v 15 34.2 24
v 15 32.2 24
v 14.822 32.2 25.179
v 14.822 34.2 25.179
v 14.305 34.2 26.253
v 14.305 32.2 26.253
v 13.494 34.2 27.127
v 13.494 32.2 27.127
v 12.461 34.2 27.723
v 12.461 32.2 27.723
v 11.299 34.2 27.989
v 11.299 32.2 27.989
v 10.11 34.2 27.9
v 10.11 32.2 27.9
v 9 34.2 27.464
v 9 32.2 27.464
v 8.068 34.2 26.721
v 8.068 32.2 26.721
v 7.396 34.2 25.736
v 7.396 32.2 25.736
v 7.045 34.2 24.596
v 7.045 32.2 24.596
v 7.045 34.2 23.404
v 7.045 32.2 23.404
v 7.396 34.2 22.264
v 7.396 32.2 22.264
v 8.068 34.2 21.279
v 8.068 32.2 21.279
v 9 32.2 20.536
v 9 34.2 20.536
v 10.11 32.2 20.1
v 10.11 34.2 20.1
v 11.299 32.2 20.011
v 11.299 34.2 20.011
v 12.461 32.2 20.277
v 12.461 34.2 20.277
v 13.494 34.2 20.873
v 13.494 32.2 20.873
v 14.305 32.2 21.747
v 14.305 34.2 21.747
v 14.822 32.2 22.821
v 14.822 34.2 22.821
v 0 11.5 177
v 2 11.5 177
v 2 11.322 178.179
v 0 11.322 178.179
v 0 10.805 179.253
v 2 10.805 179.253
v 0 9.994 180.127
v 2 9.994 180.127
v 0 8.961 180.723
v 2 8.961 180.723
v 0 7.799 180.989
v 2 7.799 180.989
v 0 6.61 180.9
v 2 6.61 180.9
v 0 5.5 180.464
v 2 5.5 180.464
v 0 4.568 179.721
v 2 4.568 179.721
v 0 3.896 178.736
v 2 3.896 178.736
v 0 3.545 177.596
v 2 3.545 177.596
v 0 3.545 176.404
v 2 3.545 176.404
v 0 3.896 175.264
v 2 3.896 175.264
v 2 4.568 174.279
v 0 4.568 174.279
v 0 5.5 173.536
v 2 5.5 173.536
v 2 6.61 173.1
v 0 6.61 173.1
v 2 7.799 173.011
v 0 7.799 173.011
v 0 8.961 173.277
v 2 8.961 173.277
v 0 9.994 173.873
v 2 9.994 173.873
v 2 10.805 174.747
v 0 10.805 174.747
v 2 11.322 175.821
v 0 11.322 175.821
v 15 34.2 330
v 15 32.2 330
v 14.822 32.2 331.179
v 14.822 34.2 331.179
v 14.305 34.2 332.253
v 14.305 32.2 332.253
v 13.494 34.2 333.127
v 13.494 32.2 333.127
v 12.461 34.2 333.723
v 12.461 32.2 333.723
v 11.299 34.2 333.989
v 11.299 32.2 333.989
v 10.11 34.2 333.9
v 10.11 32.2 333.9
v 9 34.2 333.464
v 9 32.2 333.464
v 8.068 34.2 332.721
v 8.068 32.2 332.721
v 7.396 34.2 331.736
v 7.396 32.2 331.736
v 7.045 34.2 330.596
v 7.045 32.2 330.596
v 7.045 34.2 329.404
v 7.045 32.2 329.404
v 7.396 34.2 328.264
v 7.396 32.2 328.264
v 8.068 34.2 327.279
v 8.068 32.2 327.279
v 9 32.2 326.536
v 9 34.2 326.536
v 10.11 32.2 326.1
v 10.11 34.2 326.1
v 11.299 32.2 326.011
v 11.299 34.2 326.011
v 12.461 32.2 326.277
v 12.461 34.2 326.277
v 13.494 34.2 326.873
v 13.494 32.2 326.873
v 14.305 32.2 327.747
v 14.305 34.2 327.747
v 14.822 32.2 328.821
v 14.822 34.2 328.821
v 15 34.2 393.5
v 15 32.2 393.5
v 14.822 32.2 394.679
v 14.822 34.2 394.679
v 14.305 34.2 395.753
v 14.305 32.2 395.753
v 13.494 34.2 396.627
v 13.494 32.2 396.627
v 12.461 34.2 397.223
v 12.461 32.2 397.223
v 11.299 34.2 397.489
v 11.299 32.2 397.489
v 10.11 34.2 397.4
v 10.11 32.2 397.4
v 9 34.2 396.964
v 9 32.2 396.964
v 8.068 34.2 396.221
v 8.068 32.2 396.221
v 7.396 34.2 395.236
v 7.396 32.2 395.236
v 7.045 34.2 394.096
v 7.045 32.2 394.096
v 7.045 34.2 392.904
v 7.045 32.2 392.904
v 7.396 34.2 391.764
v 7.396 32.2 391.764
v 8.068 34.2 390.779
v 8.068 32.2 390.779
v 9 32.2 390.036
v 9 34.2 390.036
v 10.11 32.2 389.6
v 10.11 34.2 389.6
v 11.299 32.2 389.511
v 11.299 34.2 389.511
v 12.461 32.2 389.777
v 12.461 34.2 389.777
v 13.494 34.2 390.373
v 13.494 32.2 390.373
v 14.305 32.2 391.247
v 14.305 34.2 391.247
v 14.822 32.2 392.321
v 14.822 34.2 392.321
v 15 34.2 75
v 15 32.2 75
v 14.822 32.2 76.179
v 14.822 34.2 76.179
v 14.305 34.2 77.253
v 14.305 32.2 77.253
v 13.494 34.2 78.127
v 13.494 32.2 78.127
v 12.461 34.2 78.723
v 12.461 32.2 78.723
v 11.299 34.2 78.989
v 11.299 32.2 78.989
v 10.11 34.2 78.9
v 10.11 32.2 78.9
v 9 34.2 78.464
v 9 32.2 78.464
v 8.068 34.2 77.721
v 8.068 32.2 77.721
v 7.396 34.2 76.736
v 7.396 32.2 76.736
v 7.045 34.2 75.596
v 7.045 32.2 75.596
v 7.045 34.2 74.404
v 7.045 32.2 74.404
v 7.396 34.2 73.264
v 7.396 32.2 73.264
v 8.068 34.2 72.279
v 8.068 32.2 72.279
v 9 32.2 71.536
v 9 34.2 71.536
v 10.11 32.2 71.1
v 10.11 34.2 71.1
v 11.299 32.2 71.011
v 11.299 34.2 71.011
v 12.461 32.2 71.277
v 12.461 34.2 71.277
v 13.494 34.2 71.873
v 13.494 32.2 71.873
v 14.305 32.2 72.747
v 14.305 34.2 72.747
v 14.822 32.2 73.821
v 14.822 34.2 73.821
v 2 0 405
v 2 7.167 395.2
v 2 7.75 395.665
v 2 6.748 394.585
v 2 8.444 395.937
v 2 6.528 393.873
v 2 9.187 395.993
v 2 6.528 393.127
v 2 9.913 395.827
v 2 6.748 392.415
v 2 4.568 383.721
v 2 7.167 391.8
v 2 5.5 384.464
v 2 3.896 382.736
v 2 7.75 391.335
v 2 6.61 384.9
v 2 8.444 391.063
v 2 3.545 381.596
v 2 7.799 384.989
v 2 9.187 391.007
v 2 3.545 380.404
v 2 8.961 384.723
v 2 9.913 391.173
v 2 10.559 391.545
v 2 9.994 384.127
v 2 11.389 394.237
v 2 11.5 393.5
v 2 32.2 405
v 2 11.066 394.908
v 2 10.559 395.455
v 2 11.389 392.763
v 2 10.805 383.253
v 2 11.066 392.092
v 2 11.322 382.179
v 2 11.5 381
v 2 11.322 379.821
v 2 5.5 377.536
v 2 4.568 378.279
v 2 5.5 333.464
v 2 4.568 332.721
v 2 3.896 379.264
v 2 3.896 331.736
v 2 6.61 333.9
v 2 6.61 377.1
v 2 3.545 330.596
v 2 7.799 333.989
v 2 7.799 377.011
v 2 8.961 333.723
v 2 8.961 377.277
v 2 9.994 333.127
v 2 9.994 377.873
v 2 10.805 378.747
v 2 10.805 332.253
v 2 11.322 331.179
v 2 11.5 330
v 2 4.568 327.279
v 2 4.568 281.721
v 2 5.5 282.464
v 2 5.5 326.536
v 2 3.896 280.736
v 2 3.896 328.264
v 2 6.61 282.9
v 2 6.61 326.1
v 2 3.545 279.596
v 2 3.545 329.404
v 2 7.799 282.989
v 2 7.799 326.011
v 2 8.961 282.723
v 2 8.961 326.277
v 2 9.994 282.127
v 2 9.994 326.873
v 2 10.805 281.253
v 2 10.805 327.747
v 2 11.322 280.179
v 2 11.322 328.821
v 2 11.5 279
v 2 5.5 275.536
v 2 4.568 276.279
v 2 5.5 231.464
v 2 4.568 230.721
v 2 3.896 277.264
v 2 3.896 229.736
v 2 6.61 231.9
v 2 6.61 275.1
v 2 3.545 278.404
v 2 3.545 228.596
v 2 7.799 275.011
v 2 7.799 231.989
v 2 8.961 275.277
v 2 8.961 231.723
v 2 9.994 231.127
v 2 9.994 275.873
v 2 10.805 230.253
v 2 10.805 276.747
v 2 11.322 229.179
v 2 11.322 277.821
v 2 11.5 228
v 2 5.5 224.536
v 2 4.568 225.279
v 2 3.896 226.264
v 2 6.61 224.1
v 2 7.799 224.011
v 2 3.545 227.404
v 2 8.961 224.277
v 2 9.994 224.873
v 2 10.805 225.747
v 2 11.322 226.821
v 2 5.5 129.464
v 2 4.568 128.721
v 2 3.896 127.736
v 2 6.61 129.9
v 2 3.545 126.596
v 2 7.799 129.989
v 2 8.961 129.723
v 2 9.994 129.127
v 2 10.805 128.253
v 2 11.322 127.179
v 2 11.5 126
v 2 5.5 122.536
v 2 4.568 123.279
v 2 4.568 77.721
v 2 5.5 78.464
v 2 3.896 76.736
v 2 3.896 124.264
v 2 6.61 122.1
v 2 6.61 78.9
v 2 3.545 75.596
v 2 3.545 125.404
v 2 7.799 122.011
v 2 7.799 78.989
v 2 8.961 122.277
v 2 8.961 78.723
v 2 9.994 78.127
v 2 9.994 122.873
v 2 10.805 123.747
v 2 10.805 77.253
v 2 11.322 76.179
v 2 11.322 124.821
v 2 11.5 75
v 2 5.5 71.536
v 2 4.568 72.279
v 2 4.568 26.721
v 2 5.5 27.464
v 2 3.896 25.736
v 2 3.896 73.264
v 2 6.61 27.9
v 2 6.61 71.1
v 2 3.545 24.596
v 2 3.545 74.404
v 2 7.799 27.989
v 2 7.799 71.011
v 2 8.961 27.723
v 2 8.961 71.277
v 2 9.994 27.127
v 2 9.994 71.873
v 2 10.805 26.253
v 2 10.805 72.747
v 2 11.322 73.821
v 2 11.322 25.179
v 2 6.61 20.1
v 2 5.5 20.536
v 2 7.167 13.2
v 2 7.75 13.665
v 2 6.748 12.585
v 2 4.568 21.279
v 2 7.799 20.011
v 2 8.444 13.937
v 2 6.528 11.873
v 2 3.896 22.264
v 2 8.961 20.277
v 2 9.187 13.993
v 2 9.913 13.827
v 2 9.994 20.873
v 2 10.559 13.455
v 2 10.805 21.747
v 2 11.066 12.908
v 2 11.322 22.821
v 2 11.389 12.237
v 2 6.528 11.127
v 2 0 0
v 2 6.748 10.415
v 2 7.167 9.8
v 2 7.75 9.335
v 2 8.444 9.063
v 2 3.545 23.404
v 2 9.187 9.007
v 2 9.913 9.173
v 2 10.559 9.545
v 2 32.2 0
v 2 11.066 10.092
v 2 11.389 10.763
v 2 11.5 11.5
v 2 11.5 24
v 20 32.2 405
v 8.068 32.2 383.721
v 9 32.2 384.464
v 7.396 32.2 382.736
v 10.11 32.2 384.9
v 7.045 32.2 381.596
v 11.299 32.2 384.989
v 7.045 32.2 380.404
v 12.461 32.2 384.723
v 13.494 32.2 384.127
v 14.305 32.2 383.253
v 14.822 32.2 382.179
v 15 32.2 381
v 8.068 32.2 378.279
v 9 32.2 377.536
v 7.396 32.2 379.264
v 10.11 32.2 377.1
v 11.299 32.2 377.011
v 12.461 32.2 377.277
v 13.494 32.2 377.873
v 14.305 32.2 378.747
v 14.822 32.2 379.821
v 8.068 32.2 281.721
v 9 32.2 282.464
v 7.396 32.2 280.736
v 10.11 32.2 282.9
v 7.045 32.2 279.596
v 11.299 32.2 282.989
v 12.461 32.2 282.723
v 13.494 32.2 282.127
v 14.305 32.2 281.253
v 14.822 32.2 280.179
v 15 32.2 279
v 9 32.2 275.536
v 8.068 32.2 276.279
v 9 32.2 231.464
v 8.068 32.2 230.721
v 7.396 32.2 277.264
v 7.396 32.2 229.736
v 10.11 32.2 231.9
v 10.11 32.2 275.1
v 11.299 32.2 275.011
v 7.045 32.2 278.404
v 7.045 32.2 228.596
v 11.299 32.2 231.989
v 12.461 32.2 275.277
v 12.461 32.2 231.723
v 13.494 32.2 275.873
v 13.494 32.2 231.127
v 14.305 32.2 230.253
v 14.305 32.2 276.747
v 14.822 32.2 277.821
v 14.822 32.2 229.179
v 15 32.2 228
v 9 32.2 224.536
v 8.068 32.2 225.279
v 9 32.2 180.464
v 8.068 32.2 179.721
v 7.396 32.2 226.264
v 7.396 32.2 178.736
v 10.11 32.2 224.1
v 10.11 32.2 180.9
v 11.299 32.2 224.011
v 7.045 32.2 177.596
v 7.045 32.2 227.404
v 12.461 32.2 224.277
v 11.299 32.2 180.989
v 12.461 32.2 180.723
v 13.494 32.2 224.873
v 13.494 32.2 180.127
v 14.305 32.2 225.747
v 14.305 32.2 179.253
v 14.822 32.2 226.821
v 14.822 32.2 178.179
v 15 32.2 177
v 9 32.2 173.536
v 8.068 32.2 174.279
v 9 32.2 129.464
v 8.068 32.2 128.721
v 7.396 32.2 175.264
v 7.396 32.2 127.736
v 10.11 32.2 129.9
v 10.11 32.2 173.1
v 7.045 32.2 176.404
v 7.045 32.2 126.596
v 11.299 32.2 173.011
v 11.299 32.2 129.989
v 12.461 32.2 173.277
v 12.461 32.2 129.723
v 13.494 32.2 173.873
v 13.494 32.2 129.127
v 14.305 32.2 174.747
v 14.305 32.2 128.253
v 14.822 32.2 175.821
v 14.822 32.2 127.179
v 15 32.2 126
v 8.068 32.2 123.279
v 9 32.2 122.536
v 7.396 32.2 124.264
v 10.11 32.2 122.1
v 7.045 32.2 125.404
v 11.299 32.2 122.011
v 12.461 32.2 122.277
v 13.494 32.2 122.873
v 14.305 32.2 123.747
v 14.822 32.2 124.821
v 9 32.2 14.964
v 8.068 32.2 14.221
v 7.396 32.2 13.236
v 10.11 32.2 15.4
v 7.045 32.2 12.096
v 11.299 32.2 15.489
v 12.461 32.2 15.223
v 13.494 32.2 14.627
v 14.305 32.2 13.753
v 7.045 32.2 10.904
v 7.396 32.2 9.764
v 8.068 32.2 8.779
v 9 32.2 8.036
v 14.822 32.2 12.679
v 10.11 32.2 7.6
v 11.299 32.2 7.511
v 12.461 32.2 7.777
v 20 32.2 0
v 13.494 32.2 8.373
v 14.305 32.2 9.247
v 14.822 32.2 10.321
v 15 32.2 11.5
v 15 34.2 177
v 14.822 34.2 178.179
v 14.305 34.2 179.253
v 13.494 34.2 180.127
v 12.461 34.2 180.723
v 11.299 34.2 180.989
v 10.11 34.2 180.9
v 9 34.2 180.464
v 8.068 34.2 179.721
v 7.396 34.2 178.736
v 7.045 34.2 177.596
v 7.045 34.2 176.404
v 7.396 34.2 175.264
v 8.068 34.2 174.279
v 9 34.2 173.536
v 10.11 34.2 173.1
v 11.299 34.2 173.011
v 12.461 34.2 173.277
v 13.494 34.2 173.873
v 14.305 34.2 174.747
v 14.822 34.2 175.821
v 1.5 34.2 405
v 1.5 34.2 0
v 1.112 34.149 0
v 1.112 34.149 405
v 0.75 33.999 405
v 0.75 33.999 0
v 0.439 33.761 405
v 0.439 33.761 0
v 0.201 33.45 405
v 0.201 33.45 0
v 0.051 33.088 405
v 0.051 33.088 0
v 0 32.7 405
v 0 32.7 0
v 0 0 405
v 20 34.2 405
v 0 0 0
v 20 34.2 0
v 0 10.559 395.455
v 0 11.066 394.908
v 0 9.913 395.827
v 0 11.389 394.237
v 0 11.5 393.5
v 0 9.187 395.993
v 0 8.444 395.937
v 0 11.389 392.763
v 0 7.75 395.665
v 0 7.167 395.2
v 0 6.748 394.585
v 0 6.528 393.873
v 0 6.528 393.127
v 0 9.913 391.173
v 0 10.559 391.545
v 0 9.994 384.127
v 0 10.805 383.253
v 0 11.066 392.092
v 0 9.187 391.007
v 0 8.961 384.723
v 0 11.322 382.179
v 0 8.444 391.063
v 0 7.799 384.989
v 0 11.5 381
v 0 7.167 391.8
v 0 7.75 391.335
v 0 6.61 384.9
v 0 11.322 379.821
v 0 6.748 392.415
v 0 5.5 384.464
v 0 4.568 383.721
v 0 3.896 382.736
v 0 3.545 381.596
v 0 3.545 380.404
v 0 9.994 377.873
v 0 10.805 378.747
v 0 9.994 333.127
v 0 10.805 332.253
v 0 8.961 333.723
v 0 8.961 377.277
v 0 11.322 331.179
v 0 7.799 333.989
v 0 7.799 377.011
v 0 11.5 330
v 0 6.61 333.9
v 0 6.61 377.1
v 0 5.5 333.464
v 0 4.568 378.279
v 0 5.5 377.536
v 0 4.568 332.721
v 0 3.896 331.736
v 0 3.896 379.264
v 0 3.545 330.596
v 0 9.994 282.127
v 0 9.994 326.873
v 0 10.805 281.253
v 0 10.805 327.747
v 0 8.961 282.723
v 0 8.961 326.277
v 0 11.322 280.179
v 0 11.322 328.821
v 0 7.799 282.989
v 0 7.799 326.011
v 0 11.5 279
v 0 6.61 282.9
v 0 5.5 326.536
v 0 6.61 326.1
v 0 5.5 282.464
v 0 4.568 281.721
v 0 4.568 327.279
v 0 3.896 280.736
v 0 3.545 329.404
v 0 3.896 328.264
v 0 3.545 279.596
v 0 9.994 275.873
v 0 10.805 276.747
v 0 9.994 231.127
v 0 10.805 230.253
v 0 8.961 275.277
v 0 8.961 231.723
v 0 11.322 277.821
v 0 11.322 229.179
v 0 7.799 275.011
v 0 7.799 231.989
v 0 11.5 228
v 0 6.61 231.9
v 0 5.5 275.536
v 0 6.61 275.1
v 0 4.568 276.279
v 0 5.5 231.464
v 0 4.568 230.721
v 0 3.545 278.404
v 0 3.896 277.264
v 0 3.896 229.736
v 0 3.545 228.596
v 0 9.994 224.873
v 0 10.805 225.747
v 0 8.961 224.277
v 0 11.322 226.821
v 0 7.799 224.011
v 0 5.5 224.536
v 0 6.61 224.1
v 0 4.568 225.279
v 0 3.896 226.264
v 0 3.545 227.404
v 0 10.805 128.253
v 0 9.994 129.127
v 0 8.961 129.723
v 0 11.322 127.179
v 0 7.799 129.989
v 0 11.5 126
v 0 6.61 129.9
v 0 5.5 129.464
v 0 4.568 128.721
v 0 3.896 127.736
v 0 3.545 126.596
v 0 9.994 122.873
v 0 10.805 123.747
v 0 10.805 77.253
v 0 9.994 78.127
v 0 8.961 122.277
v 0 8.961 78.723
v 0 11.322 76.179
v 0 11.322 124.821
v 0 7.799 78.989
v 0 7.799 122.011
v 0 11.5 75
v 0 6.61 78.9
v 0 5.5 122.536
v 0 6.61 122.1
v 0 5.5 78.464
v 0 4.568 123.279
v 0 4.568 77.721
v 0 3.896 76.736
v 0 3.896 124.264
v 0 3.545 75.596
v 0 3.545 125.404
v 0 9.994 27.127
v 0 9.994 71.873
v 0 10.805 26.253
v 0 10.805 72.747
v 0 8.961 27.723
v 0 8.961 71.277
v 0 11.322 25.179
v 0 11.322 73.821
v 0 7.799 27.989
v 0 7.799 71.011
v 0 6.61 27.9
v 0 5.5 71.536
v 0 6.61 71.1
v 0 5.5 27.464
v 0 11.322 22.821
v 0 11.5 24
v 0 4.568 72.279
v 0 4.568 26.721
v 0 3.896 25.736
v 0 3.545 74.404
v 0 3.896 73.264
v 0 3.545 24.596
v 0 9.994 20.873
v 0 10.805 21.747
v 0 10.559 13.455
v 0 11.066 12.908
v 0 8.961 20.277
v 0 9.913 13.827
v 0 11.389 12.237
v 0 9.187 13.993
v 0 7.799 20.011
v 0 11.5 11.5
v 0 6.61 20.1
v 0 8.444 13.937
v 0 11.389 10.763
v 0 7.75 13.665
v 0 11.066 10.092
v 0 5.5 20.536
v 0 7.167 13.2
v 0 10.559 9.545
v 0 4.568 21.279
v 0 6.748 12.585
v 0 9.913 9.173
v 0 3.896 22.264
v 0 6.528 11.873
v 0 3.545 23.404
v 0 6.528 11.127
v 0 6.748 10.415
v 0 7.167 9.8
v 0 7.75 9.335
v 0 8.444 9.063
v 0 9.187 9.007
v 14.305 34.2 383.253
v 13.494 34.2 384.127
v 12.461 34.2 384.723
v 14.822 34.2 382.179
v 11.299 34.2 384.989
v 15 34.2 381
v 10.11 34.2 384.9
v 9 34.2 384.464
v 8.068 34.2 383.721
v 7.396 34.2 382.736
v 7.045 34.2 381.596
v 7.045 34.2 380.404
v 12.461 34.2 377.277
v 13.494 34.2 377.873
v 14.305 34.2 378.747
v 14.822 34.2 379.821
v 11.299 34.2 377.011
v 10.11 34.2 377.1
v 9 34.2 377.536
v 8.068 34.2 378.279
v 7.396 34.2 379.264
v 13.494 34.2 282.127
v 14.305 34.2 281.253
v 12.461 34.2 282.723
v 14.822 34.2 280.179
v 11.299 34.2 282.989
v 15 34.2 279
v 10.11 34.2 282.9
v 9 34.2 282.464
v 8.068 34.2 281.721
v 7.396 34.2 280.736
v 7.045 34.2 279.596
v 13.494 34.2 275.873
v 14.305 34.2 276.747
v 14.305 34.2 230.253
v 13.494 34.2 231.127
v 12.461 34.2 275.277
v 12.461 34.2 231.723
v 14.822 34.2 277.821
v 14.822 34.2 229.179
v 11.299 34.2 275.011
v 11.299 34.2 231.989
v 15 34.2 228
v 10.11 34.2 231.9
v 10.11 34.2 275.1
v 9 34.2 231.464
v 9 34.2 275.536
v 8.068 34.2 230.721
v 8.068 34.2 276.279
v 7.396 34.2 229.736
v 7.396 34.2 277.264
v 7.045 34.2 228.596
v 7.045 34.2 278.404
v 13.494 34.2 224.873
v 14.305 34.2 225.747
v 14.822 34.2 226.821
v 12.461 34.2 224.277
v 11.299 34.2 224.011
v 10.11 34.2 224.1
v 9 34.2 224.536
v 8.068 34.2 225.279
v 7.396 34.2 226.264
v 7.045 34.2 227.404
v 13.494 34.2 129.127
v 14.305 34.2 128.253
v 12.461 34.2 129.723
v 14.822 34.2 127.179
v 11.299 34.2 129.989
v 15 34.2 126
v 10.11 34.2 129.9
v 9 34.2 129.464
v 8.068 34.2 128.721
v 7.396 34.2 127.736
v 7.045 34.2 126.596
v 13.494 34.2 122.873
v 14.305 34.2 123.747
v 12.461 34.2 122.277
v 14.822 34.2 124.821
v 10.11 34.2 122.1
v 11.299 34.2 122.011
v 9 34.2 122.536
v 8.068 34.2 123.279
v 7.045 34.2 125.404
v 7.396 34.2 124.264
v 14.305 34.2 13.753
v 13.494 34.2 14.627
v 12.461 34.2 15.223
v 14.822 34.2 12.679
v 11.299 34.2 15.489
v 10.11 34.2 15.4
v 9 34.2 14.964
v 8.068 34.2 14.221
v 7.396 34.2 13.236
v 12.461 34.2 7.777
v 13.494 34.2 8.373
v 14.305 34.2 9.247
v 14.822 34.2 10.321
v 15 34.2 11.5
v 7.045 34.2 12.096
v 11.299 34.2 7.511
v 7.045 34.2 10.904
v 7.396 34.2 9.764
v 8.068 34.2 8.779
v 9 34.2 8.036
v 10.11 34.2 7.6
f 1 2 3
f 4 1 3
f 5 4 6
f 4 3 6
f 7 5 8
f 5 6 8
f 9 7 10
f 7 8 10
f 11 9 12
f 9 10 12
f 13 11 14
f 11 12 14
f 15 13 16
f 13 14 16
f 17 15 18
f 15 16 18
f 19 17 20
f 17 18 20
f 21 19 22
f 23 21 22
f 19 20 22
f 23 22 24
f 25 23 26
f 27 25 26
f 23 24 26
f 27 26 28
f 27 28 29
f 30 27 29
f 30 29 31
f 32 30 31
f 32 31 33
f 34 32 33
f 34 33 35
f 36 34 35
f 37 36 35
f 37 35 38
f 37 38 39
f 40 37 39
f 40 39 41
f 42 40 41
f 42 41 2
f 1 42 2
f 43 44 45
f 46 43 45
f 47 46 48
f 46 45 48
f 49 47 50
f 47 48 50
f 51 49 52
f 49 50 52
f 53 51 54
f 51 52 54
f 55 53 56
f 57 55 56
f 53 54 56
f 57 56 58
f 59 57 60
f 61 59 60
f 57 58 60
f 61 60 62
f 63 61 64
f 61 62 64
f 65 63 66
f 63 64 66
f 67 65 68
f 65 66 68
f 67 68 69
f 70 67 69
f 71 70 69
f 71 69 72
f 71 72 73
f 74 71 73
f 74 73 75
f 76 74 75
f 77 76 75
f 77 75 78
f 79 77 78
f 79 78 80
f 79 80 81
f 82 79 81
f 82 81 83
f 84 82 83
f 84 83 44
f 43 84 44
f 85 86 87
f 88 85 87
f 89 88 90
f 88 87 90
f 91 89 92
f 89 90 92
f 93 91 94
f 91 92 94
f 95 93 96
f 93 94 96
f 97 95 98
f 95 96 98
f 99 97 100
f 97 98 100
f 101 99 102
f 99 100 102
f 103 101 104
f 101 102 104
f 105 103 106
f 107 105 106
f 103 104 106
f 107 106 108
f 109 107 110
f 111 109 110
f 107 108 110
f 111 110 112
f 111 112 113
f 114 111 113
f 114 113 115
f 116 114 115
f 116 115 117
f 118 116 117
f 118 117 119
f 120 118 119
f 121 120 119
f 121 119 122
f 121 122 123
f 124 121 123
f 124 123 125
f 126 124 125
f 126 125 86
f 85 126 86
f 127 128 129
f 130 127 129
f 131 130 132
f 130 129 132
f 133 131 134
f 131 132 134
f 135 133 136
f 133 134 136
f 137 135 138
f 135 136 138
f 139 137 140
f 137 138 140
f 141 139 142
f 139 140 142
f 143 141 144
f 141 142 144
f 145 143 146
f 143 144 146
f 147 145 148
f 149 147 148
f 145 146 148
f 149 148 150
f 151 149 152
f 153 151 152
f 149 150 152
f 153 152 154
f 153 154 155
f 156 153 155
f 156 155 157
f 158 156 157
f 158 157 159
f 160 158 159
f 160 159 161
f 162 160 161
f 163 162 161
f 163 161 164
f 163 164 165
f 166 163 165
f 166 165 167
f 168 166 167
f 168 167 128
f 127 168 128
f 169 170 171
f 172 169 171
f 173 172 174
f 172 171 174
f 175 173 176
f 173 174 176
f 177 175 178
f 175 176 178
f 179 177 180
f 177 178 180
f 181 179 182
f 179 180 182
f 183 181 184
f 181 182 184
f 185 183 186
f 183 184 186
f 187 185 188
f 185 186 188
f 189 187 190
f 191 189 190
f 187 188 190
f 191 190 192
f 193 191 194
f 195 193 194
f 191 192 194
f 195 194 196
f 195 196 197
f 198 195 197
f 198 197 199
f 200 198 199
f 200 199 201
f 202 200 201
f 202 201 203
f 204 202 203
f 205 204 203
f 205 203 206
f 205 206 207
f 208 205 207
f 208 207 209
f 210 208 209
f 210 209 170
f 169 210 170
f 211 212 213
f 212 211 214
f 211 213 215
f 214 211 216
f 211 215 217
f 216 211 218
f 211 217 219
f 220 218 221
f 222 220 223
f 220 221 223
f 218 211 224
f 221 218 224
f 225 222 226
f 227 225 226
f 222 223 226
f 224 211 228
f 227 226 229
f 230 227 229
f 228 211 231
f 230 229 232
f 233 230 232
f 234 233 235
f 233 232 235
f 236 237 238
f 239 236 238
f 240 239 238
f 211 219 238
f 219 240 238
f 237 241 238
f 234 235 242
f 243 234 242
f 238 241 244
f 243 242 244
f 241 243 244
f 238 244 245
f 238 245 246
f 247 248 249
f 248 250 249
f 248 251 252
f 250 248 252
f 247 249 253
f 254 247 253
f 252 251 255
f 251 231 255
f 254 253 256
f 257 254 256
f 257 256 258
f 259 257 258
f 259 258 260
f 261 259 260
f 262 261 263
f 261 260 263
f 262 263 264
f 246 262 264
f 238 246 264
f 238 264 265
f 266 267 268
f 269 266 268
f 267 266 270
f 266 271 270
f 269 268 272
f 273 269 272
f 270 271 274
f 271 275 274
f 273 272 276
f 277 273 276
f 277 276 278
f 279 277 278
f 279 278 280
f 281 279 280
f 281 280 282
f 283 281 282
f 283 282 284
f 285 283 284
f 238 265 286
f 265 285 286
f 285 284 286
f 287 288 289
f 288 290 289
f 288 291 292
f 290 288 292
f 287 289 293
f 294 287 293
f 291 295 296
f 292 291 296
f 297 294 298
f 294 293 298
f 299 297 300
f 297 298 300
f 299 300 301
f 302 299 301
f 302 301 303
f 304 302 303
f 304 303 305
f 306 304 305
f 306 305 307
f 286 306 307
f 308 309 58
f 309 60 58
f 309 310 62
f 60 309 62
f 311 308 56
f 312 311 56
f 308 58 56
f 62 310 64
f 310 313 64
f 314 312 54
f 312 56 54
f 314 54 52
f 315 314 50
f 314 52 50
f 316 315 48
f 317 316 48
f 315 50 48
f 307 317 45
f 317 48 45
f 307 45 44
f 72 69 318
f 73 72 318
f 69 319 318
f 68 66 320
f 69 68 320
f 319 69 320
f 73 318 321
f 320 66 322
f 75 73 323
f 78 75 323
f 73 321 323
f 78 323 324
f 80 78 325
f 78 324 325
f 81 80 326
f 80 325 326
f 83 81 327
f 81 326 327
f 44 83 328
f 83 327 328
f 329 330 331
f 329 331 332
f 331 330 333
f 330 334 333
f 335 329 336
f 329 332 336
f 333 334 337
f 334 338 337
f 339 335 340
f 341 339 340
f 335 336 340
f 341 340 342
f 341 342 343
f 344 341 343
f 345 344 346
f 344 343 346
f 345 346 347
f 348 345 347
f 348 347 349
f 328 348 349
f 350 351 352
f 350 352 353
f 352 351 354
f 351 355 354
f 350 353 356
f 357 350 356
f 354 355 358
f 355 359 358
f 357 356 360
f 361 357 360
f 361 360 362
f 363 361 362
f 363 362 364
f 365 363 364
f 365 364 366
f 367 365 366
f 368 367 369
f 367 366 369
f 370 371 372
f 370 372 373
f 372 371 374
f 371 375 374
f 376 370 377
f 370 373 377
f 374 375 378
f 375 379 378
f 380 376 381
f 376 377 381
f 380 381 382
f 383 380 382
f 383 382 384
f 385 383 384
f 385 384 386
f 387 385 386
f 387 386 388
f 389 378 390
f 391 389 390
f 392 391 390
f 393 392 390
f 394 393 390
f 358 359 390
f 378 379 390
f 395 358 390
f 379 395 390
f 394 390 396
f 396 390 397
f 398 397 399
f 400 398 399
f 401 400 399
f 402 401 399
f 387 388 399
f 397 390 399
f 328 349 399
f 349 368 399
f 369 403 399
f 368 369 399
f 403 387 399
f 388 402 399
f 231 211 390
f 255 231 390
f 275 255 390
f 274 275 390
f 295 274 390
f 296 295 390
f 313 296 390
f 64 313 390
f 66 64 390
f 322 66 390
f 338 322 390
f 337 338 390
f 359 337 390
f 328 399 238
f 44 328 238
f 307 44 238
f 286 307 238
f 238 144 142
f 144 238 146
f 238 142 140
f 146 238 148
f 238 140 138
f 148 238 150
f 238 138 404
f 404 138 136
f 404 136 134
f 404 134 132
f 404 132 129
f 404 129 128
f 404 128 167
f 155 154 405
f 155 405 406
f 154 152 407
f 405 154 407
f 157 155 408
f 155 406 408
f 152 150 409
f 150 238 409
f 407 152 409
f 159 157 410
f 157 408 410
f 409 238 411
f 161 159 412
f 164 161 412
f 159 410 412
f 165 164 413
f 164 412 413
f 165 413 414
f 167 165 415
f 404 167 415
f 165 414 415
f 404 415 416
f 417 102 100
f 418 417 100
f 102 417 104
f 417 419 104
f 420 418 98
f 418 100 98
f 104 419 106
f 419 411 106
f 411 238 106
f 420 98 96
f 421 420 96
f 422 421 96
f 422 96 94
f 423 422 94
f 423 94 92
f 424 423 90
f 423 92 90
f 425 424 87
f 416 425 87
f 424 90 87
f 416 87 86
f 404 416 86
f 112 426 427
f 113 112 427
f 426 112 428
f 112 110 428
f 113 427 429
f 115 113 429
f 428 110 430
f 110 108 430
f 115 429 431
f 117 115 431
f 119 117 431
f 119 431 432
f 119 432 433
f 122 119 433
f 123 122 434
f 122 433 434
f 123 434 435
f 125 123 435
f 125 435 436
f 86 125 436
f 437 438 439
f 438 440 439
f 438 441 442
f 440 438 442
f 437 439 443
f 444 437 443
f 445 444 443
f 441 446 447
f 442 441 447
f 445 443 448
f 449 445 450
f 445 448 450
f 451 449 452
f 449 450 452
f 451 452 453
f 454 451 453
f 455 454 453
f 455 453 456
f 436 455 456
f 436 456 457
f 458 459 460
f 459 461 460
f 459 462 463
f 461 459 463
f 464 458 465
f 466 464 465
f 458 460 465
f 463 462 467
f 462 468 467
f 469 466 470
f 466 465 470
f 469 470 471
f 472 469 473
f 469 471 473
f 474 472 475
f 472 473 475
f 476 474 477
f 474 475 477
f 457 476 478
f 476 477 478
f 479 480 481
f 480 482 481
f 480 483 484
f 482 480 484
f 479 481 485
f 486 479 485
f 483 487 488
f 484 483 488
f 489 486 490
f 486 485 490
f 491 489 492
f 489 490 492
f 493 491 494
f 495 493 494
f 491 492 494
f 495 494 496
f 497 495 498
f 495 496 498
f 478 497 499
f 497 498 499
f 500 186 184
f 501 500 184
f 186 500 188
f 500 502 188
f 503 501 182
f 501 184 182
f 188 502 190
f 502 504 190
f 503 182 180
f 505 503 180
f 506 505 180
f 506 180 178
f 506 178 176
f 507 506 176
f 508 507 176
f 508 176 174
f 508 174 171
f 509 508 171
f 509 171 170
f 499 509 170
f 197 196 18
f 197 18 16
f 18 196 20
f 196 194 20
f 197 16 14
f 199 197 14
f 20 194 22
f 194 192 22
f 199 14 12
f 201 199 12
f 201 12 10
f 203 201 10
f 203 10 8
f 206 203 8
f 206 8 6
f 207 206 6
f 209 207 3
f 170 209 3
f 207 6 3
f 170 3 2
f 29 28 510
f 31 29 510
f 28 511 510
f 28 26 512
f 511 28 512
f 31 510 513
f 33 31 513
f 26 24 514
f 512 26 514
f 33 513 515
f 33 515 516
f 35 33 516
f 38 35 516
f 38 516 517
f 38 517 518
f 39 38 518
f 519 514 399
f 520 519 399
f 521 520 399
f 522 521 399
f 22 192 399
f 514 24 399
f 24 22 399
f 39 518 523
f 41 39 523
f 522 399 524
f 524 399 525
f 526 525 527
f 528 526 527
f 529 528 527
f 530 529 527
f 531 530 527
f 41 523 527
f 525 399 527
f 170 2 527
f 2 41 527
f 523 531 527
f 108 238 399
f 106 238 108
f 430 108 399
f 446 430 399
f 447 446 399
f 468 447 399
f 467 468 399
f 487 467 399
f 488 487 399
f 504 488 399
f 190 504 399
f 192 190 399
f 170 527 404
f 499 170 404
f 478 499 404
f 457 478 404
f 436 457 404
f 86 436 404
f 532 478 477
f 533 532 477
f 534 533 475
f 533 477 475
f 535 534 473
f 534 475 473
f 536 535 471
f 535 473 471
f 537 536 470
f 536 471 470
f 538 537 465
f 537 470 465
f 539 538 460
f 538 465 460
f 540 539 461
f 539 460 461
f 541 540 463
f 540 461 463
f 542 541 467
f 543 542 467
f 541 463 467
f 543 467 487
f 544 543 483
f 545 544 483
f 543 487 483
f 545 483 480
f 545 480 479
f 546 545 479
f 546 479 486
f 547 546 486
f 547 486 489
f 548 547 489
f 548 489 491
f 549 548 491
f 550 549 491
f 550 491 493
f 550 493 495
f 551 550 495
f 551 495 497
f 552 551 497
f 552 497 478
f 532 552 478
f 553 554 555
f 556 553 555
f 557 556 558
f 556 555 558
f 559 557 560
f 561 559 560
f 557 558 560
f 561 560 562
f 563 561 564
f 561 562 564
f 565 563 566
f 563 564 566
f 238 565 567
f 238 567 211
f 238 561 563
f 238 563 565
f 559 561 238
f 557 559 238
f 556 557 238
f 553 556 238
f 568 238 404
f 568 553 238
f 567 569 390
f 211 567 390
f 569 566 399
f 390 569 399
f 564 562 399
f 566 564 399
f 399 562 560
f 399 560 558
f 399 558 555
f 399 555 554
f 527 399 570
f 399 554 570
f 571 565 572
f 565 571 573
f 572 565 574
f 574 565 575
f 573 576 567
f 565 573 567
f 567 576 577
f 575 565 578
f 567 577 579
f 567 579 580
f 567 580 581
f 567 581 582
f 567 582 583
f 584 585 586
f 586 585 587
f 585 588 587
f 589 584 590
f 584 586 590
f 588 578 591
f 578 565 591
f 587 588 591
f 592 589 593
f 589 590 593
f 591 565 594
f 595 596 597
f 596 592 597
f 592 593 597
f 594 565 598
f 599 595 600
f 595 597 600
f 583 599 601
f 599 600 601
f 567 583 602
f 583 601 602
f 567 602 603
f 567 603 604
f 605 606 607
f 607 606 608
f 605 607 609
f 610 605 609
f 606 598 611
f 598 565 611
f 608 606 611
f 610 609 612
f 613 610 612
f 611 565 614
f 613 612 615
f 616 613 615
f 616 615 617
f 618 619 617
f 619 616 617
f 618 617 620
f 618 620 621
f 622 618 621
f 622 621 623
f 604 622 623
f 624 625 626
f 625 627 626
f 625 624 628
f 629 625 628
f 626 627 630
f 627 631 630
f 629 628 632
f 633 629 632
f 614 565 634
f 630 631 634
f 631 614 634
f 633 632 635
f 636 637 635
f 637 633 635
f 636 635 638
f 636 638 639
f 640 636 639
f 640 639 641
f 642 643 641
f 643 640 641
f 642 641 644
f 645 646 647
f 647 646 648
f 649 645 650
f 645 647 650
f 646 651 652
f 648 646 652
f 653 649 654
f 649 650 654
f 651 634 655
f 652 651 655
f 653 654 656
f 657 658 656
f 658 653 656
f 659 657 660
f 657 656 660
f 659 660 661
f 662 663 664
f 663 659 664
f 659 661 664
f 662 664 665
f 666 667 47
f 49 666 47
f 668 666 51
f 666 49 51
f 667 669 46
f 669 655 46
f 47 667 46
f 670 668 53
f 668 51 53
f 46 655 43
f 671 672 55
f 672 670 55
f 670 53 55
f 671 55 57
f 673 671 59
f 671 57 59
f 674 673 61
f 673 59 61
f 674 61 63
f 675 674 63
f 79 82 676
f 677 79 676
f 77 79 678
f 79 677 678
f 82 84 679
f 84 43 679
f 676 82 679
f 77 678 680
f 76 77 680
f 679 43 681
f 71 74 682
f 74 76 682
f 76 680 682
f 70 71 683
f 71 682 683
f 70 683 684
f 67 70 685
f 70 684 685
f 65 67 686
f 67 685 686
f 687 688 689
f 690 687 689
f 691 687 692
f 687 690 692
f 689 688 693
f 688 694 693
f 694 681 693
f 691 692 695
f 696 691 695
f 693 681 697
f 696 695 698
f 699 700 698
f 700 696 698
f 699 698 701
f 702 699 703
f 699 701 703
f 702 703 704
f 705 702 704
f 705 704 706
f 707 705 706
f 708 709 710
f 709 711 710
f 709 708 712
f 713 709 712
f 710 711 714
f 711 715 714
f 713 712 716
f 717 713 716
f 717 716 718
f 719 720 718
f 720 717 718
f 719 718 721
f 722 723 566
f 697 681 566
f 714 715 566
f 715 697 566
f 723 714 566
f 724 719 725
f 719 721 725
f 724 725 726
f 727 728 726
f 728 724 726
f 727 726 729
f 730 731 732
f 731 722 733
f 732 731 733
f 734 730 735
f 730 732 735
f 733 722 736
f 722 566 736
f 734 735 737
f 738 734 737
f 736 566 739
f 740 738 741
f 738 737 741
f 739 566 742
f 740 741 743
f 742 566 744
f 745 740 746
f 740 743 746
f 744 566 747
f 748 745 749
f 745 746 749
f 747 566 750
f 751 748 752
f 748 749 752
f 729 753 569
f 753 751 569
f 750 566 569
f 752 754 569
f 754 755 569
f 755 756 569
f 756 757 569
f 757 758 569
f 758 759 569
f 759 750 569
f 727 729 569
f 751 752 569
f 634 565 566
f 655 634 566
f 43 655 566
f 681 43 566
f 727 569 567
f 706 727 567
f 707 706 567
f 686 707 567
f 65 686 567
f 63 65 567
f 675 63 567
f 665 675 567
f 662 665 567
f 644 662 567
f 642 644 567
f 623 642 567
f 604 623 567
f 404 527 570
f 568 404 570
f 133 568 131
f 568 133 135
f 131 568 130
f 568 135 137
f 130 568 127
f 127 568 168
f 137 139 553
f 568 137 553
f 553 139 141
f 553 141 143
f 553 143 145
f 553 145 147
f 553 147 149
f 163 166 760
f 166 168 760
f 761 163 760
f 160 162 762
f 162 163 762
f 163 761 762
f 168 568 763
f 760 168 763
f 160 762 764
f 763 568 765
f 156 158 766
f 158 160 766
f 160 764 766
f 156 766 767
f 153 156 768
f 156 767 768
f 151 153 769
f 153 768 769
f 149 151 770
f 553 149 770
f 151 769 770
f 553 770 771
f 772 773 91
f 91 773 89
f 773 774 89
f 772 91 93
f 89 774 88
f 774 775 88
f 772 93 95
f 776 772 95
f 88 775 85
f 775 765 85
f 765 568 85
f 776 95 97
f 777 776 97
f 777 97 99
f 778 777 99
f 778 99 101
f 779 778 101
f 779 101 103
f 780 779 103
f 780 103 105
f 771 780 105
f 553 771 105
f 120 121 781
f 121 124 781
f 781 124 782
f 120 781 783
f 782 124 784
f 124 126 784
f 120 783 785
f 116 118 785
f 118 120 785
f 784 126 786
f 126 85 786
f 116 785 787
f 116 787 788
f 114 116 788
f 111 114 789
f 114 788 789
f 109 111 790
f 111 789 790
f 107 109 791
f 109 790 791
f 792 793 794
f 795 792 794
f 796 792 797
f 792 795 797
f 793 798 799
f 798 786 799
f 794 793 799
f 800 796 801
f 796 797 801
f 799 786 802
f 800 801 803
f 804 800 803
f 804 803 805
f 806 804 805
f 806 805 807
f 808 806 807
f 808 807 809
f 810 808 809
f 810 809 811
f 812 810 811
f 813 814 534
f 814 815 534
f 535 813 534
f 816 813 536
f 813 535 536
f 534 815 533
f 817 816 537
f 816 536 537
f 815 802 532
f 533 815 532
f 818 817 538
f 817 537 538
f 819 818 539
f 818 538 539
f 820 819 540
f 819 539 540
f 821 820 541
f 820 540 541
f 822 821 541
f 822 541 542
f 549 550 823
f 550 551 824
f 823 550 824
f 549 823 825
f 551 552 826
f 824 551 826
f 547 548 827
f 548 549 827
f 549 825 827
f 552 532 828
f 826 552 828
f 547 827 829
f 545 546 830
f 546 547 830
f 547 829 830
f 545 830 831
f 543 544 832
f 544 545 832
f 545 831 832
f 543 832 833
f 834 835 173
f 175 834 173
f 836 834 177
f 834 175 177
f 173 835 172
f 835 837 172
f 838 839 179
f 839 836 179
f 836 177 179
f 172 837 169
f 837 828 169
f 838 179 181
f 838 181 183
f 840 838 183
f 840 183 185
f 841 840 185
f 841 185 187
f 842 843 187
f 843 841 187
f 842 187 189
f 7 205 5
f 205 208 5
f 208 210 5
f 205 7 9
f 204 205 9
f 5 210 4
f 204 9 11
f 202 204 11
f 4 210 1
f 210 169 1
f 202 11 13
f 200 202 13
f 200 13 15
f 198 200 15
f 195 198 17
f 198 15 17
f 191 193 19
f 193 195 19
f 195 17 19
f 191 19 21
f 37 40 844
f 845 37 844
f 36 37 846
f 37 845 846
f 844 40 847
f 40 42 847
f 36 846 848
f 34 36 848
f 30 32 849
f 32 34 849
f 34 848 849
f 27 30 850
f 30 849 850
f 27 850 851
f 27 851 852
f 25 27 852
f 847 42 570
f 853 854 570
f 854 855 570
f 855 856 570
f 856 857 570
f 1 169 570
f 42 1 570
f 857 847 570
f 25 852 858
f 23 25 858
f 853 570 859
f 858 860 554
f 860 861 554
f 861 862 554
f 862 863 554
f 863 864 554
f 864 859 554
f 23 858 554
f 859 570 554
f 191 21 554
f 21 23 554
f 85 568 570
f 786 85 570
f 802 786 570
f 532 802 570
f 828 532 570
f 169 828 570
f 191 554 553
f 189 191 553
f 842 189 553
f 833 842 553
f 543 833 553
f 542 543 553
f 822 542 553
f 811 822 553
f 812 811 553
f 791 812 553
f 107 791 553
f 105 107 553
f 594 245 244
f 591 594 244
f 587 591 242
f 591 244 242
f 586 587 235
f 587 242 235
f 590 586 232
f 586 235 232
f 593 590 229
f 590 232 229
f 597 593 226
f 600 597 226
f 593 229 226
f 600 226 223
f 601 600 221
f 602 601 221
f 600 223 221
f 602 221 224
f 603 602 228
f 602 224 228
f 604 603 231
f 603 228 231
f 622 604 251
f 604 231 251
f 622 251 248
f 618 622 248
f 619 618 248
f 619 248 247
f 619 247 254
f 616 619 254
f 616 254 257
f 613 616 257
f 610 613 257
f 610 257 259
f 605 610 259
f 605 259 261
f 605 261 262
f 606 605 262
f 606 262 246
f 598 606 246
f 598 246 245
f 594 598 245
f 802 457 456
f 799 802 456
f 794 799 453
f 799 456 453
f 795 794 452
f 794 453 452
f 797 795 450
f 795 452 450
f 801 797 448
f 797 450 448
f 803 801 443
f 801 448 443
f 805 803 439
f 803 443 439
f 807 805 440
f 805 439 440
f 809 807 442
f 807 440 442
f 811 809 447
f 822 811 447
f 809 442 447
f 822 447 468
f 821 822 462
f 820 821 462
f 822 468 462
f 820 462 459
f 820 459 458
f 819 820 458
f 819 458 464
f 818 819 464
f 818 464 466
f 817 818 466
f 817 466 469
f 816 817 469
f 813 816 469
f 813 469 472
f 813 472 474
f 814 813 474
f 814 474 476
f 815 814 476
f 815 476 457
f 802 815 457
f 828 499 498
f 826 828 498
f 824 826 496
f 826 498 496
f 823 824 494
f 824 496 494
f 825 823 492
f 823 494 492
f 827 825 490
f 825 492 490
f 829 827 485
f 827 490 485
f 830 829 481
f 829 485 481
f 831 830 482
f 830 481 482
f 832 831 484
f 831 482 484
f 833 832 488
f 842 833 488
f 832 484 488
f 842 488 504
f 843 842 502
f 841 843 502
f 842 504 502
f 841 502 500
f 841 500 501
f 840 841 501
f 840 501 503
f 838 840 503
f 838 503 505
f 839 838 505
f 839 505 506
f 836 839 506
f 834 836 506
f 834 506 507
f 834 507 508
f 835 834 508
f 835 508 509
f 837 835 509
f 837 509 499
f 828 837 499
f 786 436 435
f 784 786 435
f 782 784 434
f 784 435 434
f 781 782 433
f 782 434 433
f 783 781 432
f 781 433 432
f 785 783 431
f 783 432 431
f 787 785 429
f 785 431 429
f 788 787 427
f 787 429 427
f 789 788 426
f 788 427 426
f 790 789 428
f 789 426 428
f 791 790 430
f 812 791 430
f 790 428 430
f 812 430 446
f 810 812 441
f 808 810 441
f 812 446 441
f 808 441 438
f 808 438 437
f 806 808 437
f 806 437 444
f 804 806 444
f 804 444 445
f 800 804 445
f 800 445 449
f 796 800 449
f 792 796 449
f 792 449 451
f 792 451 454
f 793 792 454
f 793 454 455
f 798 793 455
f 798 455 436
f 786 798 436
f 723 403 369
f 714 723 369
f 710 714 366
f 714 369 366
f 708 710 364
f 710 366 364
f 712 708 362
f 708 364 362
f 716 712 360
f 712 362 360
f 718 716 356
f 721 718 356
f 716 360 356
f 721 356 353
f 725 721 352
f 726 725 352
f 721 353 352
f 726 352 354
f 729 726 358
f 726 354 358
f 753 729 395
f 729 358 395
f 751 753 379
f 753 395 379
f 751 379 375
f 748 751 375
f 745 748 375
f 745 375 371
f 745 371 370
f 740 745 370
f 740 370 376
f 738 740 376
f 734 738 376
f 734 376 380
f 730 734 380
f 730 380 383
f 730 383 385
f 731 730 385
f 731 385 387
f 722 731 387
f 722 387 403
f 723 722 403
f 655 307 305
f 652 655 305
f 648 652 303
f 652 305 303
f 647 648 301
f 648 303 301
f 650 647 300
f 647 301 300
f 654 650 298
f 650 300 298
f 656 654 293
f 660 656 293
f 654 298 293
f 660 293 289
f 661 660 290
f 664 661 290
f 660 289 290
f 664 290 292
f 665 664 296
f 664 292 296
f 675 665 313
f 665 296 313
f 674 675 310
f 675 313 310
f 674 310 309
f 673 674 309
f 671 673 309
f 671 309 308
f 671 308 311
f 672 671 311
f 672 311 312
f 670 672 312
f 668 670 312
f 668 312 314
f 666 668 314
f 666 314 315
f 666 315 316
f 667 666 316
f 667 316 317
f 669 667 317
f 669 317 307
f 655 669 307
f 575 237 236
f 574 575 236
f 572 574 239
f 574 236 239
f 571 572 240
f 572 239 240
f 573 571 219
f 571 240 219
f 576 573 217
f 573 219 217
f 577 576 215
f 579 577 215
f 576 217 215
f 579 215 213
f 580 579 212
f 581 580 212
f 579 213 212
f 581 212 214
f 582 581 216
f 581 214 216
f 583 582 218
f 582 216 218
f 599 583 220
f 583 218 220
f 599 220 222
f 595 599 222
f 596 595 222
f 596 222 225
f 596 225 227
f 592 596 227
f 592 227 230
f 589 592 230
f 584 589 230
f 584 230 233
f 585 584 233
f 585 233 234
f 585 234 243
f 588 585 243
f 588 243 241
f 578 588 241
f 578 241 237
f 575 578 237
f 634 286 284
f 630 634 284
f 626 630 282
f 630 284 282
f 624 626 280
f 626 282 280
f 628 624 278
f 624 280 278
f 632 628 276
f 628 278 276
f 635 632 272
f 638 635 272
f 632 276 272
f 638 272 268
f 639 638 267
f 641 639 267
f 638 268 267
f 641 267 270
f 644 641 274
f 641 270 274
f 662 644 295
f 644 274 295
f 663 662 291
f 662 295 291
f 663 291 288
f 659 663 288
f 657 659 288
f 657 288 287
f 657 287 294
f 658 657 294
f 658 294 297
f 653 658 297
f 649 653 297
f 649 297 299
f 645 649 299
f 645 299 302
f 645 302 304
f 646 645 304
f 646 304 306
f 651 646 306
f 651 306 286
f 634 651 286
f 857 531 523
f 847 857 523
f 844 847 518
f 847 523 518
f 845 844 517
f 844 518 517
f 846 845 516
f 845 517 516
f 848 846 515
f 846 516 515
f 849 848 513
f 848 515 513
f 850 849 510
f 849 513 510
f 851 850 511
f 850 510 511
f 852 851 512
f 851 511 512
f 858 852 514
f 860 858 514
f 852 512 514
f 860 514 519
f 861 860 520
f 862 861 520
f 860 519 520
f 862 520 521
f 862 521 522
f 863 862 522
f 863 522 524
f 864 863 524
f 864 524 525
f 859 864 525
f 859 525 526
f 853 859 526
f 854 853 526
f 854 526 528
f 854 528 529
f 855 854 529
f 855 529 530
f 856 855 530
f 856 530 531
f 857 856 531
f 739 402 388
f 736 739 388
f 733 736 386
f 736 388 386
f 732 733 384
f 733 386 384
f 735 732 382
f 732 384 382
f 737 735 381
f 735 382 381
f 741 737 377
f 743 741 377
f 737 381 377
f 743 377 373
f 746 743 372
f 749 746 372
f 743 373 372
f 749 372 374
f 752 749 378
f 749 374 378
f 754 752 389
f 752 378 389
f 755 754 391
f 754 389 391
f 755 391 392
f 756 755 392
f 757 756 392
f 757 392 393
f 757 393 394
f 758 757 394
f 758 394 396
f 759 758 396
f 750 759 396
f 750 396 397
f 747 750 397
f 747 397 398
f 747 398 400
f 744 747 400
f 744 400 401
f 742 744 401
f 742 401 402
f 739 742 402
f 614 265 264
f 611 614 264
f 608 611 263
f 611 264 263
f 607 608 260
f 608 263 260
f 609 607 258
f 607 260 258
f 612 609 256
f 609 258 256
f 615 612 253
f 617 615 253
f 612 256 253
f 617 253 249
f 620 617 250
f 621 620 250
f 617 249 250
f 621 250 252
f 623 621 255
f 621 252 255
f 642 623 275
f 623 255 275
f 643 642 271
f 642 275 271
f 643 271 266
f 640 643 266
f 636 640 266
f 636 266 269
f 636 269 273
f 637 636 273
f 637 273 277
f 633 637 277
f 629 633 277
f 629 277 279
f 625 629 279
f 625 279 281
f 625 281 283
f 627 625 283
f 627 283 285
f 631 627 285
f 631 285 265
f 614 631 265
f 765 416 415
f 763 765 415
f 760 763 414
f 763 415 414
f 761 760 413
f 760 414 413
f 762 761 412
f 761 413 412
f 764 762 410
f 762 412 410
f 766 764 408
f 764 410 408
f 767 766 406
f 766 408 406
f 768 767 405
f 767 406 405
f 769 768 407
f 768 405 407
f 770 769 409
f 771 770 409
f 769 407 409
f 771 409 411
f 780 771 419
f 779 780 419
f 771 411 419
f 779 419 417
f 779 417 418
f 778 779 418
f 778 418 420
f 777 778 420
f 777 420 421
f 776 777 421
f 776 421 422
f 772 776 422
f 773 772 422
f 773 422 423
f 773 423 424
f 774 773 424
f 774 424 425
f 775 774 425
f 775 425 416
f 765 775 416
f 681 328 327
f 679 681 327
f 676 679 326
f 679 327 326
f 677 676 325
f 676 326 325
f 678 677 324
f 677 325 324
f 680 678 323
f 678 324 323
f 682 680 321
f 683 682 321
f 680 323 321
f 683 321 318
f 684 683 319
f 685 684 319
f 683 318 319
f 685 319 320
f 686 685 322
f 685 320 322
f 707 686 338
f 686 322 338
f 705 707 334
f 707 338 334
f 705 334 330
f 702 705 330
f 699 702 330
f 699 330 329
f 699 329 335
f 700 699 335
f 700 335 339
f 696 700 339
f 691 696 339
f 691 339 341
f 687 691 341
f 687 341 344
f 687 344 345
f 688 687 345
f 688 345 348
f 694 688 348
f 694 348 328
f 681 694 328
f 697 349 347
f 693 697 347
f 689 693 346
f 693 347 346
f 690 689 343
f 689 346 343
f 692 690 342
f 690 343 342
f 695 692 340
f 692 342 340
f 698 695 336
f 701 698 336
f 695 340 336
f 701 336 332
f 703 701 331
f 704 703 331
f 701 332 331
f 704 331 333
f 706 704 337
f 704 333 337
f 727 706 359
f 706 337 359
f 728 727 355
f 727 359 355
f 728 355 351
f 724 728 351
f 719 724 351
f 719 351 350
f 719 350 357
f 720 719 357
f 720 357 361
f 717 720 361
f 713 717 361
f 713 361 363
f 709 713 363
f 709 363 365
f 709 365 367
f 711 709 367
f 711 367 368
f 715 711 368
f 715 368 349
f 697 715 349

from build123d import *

# Parameters (mm, degrees)
F1_DEPTH = 405
F2_R     = 2.5
F2_R_2   = 4
F3_DEPTH = 2.001
F4_R     = 4
F5_DEPTH = 2.001


with BuildPart() as f1:
    # F0 (on Top) → F1 (new body)
    with BuildSketch(Plane.XY):
        with BuildLine():
            Line((0, 32.7), (0, 0))
            Line((0, 0), (2, 0))
            Line((2, 0), (2, 32.2))
            Line((2, 32.2), (20, 32.2))
            Line((20, 32.2), (20, 34.2))
            Line((20, 34.2), (1.5, 34.2))
            ThreePointArc((1.5, 34.2), (0.43934, 33.76066), (0, 32.7))
        make_face()
    extrude(amount=F1_DEPTH)

    # F2 (on face) → F3 (cut, through all)
    with BuildSketch(Plane.YZ.offset(2)):
        with Locations((9, 393.5)):
            Circle(F2_R)
        with Locations((7.5, 381)):
            Circle(F2_R_2)
        with Locations((7.5, 330)):
            Circle(F2_R_2)
        with Locations((7.5, 279)):
            Circle(F2_R_2)
        with Locations((7.5, 228)):
            Circle(F2_R_2)
        with Locations((7.5, 177)):
            Circle(F2_R_2)
        with Locations((7.5, 126)):
            Circle(F2_R_2)
        with Locations((7.5, 75)):
            Circle(F2_R_2)
        with Locations((7.5, 24)):
            Circle(F2_R_2)
        with Locations((9, 11.5)):
            Circle(F2_R)
    extrude(amount=-F3_DEPTH, mode=Mode.SUBTRACT)

    # F4 (on face) → F5 (cut, through all)
    with BuildSketch(Plane.XZ.offset(-32.2)):
        with Locations((11, 393.5)):
            Circle(F4_R)
        with Locations((11, 381)):
            Circle(F4_R)
        with Locations((11, 330)):
            Circle(F4_R)
        with Locations((11, 279)):
            Circle(F4_R)
        with Locations((11, 228)):
            Circle(F4_R)
        with Locations((11, 177)):
            Circle(F4_R)
        with Locations((11, 126)):
            Circle(F4_R)
        with Locations((11, 75)):
            Circle(F4_R)
        with Locations((11, 11.5)):
            Circle(F4_R)
        with Locations((11, 24)):
            Circle(F4_R)
    extrude(amount=-F5_DEPTH, mode=Mode.SUBTRACT)


solid = f1.part
